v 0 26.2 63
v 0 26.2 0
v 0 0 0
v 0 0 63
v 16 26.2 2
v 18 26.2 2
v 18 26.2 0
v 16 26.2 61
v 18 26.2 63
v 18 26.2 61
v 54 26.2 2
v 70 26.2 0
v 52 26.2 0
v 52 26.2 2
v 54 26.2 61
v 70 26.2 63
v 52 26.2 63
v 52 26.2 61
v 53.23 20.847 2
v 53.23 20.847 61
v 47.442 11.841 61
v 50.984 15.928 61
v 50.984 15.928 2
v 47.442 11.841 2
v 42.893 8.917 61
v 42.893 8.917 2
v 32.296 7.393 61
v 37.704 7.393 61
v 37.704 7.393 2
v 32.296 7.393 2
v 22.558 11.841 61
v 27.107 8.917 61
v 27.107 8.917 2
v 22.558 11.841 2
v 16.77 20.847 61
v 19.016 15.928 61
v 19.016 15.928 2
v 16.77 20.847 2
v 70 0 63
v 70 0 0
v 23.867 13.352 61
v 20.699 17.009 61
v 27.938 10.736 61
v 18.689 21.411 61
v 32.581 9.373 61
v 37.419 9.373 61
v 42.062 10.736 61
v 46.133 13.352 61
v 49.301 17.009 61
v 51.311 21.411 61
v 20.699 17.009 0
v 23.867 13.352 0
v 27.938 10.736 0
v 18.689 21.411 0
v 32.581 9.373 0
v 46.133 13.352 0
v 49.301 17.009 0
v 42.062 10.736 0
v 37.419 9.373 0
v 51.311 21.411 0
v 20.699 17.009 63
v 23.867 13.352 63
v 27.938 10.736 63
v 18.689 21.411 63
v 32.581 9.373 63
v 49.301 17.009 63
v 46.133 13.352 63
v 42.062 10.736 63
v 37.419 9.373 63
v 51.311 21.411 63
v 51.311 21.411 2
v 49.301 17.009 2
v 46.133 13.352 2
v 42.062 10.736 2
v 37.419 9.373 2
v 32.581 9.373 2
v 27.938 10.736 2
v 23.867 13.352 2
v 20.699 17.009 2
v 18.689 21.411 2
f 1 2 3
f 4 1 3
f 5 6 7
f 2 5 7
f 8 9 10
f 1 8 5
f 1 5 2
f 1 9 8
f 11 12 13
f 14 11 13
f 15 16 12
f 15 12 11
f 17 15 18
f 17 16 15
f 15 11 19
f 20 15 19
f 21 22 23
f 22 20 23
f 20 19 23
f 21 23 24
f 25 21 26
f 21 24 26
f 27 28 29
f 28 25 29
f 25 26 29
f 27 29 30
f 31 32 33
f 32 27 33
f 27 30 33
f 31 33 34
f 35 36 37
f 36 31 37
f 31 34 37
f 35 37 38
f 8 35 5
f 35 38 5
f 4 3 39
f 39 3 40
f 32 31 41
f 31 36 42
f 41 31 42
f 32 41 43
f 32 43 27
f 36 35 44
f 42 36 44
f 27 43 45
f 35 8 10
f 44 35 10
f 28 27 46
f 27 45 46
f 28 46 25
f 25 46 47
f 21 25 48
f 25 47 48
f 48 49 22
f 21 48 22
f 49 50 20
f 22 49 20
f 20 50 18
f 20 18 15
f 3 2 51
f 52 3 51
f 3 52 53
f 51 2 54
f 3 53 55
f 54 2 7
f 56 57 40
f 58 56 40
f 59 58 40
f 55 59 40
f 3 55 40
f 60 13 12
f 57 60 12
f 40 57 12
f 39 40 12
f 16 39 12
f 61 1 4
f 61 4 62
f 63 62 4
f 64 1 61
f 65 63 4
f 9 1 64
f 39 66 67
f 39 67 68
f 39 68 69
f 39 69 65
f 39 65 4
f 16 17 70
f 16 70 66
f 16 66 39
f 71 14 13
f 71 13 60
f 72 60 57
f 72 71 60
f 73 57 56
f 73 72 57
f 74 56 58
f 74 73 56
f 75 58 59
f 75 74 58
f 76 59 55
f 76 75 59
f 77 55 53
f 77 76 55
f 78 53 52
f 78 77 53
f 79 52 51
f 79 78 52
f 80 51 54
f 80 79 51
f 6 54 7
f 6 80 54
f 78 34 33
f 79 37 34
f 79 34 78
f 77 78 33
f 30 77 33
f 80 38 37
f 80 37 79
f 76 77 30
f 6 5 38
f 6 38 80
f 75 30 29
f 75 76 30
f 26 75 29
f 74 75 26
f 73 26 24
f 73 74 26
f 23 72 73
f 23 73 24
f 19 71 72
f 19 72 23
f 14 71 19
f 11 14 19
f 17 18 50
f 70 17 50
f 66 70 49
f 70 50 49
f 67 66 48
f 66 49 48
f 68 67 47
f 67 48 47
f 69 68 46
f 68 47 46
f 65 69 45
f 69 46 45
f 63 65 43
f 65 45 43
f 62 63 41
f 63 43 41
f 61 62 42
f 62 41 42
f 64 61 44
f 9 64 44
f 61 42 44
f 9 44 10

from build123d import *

# Parameters (mm, degrees)
BOSS_EXTRUDE1_DEPTH = 63
BOSS_EXTRUDE2_START = -2
BOSS_EXTRUDE2_DEPTH = 2


with BuildPart() as part:
    # Sketch1 → Boss-Extrude1 (new body)
    with BuildSketch(Plane.XY):
        with BuildLine():
            Line((0, 0), (70, 0))
            Line((70, 0), (70, 26.2))
            Line((70, 26.2), (54, 26.2))
            ThreePointArc((54, 26.2), (35, 7.2), (16, 26.2))
            Line((16, 26.2), (0, 26.2))
            Line((0, 26.2), (0, 0))
        make_face()
    extrude(amount=BOSS_EXTRUDE1_DEPTH)

    # Sketch2 → Boss-Extrude2 (add)
    with BuildSketch(Plane.XY.offset(63).offset(BOSS_EXTRUDE2_START)):
        with BuildLine():
            Line((18, 26.2), (16, 26.2))
            ThreePointArc((16, 26.2), (35, 7.2), (54, 26.2))
            Line((54, 26.2), (52, 26.2))
            ThreePointArc((52, 26.2), (35, 9.2), (18, 26.2))
        make_face()
    boss_extrude2 = extrude(amount=BOSS_EXTRUDE2_DEPTH)

    # Mirror1: Boss-Extrude2 across plane
    add(boss_extrude2.mirror(Plane(origin=(0, 0, 31.5), x_dir=(1, 0, 0), z_dir=(0, 0, -1))))


solid = part.part
